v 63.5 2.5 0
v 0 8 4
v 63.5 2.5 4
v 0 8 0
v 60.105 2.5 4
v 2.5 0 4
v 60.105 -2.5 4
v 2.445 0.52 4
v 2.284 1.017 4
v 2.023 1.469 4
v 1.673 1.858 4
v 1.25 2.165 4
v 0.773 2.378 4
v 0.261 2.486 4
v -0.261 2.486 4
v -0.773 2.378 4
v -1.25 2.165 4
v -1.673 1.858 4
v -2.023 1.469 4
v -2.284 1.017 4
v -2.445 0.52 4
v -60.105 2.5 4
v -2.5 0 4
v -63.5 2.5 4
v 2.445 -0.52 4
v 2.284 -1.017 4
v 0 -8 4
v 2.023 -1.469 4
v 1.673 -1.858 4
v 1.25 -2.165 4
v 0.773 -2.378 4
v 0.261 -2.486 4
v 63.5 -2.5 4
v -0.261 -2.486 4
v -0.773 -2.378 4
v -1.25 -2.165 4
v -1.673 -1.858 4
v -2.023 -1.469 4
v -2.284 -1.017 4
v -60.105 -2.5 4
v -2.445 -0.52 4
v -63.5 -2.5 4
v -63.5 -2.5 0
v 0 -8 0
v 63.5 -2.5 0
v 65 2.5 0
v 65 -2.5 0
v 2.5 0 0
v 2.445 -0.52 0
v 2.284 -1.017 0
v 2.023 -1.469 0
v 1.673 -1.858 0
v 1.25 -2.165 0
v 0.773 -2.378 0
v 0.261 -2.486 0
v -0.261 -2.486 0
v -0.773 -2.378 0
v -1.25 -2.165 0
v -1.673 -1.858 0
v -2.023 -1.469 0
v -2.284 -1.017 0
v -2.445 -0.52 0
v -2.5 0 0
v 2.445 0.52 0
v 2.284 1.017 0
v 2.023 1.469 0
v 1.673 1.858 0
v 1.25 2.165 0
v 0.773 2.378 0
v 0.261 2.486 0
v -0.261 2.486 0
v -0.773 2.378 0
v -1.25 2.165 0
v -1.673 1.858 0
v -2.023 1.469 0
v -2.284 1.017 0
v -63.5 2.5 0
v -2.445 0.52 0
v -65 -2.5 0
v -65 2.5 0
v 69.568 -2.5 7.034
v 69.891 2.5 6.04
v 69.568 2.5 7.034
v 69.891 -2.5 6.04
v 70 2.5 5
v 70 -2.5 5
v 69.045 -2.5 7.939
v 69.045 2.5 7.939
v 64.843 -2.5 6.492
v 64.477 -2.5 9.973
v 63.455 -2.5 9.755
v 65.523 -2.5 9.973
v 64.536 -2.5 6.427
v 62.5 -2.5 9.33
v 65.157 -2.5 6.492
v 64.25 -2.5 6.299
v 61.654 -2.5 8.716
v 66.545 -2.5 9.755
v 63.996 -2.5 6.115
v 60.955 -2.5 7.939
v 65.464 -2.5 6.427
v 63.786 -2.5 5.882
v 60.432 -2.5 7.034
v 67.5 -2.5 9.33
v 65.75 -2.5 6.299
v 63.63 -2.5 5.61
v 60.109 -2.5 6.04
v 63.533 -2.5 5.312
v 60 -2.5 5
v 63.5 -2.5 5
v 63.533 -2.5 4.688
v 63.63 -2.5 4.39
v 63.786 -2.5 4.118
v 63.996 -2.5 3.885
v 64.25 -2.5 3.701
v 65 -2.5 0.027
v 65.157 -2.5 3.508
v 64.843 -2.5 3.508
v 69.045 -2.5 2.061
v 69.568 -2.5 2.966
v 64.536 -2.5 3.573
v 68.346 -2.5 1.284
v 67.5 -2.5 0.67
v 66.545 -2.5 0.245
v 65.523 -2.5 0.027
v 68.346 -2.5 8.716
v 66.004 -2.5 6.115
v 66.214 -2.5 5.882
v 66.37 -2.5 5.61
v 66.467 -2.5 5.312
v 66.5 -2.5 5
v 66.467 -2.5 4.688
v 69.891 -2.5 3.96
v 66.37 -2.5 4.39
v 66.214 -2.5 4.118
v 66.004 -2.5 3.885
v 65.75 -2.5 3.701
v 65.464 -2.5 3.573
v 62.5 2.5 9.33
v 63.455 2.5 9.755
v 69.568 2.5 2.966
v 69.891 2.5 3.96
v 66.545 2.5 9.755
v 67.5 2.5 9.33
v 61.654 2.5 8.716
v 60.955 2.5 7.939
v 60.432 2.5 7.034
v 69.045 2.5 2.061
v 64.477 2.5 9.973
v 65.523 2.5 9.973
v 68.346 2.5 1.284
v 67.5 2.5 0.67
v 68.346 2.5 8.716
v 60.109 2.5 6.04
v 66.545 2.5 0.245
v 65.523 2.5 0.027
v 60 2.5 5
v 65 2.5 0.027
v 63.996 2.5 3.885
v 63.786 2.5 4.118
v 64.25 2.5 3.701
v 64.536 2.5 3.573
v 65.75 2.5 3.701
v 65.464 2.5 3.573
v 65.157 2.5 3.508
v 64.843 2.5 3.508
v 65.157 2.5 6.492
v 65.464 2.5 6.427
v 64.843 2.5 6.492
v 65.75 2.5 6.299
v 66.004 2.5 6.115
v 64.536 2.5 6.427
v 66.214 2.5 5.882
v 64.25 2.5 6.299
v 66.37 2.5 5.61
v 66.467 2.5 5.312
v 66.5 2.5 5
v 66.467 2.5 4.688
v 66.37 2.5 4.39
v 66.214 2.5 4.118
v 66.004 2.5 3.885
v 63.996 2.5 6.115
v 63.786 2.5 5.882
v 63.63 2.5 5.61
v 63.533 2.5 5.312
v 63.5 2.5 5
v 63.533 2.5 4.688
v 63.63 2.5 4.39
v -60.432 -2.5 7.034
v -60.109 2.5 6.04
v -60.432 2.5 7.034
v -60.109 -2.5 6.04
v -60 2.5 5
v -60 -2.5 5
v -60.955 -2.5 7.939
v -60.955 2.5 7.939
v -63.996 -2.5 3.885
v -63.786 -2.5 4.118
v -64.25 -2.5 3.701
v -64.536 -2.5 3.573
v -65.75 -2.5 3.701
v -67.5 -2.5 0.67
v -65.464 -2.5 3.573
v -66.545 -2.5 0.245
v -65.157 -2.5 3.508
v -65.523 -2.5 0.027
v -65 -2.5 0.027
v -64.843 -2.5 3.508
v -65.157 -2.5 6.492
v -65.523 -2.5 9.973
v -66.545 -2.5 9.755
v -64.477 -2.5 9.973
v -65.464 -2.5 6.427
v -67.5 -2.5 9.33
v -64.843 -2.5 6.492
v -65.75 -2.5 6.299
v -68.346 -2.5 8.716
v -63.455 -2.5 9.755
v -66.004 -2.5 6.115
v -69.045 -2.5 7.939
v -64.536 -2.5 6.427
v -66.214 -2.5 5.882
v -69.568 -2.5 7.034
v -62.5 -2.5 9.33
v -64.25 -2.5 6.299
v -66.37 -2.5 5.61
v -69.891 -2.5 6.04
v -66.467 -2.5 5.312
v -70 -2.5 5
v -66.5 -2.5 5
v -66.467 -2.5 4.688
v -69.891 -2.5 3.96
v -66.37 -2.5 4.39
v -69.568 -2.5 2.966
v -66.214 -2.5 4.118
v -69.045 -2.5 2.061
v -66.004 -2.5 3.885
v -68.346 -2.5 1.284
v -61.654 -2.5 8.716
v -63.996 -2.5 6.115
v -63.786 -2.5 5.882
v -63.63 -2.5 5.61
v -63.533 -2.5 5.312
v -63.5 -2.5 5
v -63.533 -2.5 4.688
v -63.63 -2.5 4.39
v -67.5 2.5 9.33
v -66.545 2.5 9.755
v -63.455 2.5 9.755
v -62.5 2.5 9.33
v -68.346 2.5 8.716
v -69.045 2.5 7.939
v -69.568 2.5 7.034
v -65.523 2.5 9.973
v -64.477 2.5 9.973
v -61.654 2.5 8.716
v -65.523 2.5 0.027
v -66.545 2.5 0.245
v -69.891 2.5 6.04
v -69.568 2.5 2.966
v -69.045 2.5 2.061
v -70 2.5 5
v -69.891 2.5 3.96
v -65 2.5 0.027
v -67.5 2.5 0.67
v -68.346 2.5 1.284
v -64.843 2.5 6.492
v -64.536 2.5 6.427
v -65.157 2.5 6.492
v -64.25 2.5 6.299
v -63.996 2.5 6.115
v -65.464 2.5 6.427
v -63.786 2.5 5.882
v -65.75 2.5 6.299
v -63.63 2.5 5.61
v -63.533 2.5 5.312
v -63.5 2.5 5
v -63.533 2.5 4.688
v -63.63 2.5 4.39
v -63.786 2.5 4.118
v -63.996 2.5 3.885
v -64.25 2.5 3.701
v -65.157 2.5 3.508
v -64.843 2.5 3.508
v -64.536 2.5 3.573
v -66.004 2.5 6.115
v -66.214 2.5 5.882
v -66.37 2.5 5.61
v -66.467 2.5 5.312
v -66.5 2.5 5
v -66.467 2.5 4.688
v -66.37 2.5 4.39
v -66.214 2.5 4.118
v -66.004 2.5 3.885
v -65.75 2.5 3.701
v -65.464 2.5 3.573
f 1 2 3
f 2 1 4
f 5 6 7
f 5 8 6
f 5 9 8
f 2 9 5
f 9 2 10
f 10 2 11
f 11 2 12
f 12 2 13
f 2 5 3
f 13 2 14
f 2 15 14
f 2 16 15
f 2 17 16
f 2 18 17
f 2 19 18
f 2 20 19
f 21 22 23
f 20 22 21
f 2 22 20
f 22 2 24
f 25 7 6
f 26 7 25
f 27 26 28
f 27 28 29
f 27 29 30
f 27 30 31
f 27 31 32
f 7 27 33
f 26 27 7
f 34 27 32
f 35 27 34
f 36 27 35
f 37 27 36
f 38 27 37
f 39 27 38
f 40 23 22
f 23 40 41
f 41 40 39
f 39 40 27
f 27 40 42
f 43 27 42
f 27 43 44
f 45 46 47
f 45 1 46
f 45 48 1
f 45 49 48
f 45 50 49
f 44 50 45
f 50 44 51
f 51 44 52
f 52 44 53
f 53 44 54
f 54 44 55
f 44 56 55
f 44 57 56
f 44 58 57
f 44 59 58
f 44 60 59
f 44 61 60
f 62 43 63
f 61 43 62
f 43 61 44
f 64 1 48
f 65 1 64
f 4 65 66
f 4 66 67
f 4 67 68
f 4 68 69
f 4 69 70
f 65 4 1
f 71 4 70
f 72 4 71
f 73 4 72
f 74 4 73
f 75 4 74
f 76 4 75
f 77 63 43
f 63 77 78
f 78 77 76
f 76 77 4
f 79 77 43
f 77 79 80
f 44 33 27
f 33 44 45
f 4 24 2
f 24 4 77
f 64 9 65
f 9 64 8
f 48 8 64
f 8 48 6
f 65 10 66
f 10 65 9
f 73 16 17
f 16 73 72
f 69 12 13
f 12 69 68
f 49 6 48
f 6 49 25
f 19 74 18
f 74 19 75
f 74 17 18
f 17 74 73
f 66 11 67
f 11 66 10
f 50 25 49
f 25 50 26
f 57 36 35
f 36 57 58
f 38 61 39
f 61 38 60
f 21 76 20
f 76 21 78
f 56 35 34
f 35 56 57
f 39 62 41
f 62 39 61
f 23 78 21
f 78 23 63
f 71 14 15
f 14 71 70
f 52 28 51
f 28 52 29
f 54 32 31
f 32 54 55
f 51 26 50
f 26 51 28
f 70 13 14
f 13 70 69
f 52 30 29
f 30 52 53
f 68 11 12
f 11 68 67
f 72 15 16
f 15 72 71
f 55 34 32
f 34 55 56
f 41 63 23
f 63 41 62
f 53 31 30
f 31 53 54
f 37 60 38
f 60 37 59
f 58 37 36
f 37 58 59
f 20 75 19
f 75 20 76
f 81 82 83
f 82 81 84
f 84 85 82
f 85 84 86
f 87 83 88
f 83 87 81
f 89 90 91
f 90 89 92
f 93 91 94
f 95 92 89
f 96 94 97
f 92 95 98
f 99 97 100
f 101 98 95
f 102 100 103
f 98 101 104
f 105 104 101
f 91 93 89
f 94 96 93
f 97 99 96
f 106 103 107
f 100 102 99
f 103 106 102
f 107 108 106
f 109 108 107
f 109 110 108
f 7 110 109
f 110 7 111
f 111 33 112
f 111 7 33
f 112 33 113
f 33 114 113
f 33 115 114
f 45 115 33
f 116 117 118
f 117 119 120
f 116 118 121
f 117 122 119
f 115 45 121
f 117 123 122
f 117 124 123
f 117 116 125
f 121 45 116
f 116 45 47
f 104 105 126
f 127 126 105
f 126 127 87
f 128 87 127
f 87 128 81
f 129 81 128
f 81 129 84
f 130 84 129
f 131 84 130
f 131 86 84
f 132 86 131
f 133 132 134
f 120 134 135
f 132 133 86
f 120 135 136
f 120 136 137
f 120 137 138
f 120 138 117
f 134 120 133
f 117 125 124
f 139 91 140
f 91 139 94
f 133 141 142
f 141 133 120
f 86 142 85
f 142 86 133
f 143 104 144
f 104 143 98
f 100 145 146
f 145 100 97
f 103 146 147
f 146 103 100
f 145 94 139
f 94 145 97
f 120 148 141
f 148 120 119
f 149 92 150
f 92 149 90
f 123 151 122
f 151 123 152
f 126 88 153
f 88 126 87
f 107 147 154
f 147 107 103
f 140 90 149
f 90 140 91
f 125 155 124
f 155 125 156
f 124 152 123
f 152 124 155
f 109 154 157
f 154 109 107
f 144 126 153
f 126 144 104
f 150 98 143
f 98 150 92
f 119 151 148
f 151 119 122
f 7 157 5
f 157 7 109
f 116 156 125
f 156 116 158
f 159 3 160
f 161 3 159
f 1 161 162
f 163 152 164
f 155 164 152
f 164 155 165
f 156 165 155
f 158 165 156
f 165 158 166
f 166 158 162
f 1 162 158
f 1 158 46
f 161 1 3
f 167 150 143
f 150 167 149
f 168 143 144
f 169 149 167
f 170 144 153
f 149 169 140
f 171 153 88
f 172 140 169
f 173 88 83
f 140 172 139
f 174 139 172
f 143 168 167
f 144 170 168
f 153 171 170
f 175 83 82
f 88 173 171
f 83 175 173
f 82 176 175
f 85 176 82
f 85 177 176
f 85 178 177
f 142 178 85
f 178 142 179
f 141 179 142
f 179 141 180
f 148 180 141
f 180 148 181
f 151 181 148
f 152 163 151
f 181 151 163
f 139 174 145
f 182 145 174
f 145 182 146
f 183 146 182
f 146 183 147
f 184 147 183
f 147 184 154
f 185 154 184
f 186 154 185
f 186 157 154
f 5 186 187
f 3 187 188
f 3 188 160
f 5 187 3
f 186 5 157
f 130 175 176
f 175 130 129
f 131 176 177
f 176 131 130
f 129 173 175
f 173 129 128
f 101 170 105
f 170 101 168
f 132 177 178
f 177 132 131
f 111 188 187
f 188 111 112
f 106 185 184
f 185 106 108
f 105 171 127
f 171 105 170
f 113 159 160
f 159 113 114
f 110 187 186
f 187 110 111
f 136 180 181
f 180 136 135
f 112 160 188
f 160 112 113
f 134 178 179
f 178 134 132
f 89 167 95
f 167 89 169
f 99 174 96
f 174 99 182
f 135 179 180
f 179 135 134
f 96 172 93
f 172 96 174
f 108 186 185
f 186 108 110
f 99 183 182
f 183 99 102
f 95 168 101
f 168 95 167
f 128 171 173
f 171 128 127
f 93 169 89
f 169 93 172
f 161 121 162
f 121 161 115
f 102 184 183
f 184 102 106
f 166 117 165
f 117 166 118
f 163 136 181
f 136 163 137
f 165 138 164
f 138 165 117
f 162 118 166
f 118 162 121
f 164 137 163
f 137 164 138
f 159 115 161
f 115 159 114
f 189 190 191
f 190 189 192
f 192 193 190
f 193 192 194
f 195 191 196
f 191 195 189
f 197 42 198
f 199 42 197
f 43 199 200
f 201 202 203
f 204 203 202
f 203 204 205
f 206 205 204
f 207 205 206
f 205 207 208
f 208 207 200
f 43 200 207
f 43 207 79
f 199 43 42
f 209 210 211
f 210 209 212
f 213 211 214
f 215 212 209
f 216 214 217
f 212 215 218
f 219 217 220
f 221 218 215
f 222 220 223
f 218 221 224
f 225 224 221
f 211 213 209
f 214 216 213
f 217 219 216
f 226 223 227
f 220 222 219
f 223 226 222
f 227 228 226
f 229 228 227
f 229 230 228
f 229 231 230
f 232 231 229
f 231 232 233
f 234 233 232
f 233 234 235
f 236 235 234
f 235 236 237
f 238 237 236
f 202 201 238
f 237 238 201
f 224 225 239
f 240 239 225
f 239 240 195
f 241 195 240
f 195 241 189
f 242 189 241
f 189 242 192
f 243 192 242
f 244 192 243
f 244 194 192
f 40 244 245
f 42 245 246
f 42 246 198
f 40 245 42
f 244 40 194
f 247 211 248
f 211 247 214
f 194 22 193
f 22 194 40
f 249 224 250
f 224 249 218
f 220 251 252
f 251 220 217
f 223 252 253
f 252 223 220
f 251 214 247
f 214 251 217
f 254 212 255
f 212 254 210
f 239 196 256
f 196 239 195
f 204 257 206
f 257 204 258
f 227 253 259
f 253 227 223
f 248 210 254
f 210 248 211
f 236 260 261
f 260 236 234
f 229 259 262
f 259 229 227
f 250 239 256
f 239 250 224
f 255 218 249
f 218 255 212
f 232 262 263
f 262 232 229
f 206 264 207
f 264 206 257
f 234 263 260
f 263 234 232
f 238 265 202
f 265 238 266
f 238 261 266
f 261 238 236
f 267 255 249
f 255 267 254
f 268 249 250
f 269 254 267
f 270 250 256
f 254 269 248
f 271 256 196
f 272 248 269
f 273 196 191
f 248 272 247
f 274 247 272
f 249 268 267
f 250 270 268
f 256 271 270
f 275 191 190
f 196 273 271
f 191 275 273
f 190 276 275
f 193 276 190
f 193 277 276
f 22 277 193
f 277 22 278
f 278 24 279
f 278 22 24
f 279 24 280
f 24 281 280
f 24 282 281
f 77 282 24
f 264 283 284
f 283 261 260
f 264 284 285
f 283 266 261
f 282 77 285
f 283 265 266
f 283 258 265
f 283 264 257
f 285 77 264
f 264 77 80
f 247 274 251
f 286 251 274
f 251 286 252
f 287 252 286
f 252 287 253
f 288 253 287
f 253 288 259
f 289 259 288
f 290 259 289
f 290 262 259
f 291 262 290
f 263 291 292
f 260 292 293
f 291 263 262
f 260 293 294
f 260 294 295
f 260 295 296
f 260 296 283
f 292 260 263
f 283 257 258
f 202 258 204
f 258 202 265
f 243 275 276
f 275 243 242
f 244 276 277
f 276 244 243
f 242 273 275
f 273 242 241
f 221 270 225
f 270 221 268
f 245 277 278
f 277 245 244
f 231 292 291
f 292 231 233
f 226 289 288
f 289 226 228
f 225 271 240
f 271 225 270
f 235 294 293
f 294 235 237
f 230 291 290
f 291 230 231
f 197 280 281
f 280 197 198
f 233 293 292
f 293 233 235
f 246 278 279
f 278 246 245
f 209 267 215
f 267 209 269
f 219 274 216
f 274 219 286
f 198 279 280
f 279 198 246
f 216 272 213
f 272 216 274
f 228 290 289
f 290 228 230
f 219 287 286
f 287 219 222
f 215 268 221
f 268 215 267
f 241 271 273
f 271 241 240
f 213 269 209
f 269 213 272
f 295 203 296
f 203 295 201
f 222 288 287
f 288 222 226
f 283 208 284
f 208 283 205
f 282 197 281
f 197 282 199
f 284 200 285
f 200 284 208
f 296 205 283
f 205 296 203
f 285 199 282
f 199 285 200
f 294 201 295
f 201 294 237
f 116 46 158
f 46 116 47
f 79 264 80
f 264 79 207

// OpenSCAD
$fn=30;

difference(){

linear_extrude(height=4)
polygon(
[[-63.5,2.5],
[0,8],
[63.5,2.5],
[63.5,-2.5],
[0,-8],
[-63.5,-2.5]]);

cylinder(d=5,h=10,center=true);
}

translate([65,0,5])rotate([90,0,0])
difference(){
cylinder(d=10,h=5,center=true);
cylinder(d=3,h=7,center=true);
}

translate([-65,0,5])rotate([90,0,0])
difference(){
cylinder(d=10,h=5,center=true);
cylinder(d=3,h=7,center=true);
}

translate([60,-2.5,0])
cube([5,5,1.5]);

translate([-65,-2.5,0])
cube([5,5,1.5]);
